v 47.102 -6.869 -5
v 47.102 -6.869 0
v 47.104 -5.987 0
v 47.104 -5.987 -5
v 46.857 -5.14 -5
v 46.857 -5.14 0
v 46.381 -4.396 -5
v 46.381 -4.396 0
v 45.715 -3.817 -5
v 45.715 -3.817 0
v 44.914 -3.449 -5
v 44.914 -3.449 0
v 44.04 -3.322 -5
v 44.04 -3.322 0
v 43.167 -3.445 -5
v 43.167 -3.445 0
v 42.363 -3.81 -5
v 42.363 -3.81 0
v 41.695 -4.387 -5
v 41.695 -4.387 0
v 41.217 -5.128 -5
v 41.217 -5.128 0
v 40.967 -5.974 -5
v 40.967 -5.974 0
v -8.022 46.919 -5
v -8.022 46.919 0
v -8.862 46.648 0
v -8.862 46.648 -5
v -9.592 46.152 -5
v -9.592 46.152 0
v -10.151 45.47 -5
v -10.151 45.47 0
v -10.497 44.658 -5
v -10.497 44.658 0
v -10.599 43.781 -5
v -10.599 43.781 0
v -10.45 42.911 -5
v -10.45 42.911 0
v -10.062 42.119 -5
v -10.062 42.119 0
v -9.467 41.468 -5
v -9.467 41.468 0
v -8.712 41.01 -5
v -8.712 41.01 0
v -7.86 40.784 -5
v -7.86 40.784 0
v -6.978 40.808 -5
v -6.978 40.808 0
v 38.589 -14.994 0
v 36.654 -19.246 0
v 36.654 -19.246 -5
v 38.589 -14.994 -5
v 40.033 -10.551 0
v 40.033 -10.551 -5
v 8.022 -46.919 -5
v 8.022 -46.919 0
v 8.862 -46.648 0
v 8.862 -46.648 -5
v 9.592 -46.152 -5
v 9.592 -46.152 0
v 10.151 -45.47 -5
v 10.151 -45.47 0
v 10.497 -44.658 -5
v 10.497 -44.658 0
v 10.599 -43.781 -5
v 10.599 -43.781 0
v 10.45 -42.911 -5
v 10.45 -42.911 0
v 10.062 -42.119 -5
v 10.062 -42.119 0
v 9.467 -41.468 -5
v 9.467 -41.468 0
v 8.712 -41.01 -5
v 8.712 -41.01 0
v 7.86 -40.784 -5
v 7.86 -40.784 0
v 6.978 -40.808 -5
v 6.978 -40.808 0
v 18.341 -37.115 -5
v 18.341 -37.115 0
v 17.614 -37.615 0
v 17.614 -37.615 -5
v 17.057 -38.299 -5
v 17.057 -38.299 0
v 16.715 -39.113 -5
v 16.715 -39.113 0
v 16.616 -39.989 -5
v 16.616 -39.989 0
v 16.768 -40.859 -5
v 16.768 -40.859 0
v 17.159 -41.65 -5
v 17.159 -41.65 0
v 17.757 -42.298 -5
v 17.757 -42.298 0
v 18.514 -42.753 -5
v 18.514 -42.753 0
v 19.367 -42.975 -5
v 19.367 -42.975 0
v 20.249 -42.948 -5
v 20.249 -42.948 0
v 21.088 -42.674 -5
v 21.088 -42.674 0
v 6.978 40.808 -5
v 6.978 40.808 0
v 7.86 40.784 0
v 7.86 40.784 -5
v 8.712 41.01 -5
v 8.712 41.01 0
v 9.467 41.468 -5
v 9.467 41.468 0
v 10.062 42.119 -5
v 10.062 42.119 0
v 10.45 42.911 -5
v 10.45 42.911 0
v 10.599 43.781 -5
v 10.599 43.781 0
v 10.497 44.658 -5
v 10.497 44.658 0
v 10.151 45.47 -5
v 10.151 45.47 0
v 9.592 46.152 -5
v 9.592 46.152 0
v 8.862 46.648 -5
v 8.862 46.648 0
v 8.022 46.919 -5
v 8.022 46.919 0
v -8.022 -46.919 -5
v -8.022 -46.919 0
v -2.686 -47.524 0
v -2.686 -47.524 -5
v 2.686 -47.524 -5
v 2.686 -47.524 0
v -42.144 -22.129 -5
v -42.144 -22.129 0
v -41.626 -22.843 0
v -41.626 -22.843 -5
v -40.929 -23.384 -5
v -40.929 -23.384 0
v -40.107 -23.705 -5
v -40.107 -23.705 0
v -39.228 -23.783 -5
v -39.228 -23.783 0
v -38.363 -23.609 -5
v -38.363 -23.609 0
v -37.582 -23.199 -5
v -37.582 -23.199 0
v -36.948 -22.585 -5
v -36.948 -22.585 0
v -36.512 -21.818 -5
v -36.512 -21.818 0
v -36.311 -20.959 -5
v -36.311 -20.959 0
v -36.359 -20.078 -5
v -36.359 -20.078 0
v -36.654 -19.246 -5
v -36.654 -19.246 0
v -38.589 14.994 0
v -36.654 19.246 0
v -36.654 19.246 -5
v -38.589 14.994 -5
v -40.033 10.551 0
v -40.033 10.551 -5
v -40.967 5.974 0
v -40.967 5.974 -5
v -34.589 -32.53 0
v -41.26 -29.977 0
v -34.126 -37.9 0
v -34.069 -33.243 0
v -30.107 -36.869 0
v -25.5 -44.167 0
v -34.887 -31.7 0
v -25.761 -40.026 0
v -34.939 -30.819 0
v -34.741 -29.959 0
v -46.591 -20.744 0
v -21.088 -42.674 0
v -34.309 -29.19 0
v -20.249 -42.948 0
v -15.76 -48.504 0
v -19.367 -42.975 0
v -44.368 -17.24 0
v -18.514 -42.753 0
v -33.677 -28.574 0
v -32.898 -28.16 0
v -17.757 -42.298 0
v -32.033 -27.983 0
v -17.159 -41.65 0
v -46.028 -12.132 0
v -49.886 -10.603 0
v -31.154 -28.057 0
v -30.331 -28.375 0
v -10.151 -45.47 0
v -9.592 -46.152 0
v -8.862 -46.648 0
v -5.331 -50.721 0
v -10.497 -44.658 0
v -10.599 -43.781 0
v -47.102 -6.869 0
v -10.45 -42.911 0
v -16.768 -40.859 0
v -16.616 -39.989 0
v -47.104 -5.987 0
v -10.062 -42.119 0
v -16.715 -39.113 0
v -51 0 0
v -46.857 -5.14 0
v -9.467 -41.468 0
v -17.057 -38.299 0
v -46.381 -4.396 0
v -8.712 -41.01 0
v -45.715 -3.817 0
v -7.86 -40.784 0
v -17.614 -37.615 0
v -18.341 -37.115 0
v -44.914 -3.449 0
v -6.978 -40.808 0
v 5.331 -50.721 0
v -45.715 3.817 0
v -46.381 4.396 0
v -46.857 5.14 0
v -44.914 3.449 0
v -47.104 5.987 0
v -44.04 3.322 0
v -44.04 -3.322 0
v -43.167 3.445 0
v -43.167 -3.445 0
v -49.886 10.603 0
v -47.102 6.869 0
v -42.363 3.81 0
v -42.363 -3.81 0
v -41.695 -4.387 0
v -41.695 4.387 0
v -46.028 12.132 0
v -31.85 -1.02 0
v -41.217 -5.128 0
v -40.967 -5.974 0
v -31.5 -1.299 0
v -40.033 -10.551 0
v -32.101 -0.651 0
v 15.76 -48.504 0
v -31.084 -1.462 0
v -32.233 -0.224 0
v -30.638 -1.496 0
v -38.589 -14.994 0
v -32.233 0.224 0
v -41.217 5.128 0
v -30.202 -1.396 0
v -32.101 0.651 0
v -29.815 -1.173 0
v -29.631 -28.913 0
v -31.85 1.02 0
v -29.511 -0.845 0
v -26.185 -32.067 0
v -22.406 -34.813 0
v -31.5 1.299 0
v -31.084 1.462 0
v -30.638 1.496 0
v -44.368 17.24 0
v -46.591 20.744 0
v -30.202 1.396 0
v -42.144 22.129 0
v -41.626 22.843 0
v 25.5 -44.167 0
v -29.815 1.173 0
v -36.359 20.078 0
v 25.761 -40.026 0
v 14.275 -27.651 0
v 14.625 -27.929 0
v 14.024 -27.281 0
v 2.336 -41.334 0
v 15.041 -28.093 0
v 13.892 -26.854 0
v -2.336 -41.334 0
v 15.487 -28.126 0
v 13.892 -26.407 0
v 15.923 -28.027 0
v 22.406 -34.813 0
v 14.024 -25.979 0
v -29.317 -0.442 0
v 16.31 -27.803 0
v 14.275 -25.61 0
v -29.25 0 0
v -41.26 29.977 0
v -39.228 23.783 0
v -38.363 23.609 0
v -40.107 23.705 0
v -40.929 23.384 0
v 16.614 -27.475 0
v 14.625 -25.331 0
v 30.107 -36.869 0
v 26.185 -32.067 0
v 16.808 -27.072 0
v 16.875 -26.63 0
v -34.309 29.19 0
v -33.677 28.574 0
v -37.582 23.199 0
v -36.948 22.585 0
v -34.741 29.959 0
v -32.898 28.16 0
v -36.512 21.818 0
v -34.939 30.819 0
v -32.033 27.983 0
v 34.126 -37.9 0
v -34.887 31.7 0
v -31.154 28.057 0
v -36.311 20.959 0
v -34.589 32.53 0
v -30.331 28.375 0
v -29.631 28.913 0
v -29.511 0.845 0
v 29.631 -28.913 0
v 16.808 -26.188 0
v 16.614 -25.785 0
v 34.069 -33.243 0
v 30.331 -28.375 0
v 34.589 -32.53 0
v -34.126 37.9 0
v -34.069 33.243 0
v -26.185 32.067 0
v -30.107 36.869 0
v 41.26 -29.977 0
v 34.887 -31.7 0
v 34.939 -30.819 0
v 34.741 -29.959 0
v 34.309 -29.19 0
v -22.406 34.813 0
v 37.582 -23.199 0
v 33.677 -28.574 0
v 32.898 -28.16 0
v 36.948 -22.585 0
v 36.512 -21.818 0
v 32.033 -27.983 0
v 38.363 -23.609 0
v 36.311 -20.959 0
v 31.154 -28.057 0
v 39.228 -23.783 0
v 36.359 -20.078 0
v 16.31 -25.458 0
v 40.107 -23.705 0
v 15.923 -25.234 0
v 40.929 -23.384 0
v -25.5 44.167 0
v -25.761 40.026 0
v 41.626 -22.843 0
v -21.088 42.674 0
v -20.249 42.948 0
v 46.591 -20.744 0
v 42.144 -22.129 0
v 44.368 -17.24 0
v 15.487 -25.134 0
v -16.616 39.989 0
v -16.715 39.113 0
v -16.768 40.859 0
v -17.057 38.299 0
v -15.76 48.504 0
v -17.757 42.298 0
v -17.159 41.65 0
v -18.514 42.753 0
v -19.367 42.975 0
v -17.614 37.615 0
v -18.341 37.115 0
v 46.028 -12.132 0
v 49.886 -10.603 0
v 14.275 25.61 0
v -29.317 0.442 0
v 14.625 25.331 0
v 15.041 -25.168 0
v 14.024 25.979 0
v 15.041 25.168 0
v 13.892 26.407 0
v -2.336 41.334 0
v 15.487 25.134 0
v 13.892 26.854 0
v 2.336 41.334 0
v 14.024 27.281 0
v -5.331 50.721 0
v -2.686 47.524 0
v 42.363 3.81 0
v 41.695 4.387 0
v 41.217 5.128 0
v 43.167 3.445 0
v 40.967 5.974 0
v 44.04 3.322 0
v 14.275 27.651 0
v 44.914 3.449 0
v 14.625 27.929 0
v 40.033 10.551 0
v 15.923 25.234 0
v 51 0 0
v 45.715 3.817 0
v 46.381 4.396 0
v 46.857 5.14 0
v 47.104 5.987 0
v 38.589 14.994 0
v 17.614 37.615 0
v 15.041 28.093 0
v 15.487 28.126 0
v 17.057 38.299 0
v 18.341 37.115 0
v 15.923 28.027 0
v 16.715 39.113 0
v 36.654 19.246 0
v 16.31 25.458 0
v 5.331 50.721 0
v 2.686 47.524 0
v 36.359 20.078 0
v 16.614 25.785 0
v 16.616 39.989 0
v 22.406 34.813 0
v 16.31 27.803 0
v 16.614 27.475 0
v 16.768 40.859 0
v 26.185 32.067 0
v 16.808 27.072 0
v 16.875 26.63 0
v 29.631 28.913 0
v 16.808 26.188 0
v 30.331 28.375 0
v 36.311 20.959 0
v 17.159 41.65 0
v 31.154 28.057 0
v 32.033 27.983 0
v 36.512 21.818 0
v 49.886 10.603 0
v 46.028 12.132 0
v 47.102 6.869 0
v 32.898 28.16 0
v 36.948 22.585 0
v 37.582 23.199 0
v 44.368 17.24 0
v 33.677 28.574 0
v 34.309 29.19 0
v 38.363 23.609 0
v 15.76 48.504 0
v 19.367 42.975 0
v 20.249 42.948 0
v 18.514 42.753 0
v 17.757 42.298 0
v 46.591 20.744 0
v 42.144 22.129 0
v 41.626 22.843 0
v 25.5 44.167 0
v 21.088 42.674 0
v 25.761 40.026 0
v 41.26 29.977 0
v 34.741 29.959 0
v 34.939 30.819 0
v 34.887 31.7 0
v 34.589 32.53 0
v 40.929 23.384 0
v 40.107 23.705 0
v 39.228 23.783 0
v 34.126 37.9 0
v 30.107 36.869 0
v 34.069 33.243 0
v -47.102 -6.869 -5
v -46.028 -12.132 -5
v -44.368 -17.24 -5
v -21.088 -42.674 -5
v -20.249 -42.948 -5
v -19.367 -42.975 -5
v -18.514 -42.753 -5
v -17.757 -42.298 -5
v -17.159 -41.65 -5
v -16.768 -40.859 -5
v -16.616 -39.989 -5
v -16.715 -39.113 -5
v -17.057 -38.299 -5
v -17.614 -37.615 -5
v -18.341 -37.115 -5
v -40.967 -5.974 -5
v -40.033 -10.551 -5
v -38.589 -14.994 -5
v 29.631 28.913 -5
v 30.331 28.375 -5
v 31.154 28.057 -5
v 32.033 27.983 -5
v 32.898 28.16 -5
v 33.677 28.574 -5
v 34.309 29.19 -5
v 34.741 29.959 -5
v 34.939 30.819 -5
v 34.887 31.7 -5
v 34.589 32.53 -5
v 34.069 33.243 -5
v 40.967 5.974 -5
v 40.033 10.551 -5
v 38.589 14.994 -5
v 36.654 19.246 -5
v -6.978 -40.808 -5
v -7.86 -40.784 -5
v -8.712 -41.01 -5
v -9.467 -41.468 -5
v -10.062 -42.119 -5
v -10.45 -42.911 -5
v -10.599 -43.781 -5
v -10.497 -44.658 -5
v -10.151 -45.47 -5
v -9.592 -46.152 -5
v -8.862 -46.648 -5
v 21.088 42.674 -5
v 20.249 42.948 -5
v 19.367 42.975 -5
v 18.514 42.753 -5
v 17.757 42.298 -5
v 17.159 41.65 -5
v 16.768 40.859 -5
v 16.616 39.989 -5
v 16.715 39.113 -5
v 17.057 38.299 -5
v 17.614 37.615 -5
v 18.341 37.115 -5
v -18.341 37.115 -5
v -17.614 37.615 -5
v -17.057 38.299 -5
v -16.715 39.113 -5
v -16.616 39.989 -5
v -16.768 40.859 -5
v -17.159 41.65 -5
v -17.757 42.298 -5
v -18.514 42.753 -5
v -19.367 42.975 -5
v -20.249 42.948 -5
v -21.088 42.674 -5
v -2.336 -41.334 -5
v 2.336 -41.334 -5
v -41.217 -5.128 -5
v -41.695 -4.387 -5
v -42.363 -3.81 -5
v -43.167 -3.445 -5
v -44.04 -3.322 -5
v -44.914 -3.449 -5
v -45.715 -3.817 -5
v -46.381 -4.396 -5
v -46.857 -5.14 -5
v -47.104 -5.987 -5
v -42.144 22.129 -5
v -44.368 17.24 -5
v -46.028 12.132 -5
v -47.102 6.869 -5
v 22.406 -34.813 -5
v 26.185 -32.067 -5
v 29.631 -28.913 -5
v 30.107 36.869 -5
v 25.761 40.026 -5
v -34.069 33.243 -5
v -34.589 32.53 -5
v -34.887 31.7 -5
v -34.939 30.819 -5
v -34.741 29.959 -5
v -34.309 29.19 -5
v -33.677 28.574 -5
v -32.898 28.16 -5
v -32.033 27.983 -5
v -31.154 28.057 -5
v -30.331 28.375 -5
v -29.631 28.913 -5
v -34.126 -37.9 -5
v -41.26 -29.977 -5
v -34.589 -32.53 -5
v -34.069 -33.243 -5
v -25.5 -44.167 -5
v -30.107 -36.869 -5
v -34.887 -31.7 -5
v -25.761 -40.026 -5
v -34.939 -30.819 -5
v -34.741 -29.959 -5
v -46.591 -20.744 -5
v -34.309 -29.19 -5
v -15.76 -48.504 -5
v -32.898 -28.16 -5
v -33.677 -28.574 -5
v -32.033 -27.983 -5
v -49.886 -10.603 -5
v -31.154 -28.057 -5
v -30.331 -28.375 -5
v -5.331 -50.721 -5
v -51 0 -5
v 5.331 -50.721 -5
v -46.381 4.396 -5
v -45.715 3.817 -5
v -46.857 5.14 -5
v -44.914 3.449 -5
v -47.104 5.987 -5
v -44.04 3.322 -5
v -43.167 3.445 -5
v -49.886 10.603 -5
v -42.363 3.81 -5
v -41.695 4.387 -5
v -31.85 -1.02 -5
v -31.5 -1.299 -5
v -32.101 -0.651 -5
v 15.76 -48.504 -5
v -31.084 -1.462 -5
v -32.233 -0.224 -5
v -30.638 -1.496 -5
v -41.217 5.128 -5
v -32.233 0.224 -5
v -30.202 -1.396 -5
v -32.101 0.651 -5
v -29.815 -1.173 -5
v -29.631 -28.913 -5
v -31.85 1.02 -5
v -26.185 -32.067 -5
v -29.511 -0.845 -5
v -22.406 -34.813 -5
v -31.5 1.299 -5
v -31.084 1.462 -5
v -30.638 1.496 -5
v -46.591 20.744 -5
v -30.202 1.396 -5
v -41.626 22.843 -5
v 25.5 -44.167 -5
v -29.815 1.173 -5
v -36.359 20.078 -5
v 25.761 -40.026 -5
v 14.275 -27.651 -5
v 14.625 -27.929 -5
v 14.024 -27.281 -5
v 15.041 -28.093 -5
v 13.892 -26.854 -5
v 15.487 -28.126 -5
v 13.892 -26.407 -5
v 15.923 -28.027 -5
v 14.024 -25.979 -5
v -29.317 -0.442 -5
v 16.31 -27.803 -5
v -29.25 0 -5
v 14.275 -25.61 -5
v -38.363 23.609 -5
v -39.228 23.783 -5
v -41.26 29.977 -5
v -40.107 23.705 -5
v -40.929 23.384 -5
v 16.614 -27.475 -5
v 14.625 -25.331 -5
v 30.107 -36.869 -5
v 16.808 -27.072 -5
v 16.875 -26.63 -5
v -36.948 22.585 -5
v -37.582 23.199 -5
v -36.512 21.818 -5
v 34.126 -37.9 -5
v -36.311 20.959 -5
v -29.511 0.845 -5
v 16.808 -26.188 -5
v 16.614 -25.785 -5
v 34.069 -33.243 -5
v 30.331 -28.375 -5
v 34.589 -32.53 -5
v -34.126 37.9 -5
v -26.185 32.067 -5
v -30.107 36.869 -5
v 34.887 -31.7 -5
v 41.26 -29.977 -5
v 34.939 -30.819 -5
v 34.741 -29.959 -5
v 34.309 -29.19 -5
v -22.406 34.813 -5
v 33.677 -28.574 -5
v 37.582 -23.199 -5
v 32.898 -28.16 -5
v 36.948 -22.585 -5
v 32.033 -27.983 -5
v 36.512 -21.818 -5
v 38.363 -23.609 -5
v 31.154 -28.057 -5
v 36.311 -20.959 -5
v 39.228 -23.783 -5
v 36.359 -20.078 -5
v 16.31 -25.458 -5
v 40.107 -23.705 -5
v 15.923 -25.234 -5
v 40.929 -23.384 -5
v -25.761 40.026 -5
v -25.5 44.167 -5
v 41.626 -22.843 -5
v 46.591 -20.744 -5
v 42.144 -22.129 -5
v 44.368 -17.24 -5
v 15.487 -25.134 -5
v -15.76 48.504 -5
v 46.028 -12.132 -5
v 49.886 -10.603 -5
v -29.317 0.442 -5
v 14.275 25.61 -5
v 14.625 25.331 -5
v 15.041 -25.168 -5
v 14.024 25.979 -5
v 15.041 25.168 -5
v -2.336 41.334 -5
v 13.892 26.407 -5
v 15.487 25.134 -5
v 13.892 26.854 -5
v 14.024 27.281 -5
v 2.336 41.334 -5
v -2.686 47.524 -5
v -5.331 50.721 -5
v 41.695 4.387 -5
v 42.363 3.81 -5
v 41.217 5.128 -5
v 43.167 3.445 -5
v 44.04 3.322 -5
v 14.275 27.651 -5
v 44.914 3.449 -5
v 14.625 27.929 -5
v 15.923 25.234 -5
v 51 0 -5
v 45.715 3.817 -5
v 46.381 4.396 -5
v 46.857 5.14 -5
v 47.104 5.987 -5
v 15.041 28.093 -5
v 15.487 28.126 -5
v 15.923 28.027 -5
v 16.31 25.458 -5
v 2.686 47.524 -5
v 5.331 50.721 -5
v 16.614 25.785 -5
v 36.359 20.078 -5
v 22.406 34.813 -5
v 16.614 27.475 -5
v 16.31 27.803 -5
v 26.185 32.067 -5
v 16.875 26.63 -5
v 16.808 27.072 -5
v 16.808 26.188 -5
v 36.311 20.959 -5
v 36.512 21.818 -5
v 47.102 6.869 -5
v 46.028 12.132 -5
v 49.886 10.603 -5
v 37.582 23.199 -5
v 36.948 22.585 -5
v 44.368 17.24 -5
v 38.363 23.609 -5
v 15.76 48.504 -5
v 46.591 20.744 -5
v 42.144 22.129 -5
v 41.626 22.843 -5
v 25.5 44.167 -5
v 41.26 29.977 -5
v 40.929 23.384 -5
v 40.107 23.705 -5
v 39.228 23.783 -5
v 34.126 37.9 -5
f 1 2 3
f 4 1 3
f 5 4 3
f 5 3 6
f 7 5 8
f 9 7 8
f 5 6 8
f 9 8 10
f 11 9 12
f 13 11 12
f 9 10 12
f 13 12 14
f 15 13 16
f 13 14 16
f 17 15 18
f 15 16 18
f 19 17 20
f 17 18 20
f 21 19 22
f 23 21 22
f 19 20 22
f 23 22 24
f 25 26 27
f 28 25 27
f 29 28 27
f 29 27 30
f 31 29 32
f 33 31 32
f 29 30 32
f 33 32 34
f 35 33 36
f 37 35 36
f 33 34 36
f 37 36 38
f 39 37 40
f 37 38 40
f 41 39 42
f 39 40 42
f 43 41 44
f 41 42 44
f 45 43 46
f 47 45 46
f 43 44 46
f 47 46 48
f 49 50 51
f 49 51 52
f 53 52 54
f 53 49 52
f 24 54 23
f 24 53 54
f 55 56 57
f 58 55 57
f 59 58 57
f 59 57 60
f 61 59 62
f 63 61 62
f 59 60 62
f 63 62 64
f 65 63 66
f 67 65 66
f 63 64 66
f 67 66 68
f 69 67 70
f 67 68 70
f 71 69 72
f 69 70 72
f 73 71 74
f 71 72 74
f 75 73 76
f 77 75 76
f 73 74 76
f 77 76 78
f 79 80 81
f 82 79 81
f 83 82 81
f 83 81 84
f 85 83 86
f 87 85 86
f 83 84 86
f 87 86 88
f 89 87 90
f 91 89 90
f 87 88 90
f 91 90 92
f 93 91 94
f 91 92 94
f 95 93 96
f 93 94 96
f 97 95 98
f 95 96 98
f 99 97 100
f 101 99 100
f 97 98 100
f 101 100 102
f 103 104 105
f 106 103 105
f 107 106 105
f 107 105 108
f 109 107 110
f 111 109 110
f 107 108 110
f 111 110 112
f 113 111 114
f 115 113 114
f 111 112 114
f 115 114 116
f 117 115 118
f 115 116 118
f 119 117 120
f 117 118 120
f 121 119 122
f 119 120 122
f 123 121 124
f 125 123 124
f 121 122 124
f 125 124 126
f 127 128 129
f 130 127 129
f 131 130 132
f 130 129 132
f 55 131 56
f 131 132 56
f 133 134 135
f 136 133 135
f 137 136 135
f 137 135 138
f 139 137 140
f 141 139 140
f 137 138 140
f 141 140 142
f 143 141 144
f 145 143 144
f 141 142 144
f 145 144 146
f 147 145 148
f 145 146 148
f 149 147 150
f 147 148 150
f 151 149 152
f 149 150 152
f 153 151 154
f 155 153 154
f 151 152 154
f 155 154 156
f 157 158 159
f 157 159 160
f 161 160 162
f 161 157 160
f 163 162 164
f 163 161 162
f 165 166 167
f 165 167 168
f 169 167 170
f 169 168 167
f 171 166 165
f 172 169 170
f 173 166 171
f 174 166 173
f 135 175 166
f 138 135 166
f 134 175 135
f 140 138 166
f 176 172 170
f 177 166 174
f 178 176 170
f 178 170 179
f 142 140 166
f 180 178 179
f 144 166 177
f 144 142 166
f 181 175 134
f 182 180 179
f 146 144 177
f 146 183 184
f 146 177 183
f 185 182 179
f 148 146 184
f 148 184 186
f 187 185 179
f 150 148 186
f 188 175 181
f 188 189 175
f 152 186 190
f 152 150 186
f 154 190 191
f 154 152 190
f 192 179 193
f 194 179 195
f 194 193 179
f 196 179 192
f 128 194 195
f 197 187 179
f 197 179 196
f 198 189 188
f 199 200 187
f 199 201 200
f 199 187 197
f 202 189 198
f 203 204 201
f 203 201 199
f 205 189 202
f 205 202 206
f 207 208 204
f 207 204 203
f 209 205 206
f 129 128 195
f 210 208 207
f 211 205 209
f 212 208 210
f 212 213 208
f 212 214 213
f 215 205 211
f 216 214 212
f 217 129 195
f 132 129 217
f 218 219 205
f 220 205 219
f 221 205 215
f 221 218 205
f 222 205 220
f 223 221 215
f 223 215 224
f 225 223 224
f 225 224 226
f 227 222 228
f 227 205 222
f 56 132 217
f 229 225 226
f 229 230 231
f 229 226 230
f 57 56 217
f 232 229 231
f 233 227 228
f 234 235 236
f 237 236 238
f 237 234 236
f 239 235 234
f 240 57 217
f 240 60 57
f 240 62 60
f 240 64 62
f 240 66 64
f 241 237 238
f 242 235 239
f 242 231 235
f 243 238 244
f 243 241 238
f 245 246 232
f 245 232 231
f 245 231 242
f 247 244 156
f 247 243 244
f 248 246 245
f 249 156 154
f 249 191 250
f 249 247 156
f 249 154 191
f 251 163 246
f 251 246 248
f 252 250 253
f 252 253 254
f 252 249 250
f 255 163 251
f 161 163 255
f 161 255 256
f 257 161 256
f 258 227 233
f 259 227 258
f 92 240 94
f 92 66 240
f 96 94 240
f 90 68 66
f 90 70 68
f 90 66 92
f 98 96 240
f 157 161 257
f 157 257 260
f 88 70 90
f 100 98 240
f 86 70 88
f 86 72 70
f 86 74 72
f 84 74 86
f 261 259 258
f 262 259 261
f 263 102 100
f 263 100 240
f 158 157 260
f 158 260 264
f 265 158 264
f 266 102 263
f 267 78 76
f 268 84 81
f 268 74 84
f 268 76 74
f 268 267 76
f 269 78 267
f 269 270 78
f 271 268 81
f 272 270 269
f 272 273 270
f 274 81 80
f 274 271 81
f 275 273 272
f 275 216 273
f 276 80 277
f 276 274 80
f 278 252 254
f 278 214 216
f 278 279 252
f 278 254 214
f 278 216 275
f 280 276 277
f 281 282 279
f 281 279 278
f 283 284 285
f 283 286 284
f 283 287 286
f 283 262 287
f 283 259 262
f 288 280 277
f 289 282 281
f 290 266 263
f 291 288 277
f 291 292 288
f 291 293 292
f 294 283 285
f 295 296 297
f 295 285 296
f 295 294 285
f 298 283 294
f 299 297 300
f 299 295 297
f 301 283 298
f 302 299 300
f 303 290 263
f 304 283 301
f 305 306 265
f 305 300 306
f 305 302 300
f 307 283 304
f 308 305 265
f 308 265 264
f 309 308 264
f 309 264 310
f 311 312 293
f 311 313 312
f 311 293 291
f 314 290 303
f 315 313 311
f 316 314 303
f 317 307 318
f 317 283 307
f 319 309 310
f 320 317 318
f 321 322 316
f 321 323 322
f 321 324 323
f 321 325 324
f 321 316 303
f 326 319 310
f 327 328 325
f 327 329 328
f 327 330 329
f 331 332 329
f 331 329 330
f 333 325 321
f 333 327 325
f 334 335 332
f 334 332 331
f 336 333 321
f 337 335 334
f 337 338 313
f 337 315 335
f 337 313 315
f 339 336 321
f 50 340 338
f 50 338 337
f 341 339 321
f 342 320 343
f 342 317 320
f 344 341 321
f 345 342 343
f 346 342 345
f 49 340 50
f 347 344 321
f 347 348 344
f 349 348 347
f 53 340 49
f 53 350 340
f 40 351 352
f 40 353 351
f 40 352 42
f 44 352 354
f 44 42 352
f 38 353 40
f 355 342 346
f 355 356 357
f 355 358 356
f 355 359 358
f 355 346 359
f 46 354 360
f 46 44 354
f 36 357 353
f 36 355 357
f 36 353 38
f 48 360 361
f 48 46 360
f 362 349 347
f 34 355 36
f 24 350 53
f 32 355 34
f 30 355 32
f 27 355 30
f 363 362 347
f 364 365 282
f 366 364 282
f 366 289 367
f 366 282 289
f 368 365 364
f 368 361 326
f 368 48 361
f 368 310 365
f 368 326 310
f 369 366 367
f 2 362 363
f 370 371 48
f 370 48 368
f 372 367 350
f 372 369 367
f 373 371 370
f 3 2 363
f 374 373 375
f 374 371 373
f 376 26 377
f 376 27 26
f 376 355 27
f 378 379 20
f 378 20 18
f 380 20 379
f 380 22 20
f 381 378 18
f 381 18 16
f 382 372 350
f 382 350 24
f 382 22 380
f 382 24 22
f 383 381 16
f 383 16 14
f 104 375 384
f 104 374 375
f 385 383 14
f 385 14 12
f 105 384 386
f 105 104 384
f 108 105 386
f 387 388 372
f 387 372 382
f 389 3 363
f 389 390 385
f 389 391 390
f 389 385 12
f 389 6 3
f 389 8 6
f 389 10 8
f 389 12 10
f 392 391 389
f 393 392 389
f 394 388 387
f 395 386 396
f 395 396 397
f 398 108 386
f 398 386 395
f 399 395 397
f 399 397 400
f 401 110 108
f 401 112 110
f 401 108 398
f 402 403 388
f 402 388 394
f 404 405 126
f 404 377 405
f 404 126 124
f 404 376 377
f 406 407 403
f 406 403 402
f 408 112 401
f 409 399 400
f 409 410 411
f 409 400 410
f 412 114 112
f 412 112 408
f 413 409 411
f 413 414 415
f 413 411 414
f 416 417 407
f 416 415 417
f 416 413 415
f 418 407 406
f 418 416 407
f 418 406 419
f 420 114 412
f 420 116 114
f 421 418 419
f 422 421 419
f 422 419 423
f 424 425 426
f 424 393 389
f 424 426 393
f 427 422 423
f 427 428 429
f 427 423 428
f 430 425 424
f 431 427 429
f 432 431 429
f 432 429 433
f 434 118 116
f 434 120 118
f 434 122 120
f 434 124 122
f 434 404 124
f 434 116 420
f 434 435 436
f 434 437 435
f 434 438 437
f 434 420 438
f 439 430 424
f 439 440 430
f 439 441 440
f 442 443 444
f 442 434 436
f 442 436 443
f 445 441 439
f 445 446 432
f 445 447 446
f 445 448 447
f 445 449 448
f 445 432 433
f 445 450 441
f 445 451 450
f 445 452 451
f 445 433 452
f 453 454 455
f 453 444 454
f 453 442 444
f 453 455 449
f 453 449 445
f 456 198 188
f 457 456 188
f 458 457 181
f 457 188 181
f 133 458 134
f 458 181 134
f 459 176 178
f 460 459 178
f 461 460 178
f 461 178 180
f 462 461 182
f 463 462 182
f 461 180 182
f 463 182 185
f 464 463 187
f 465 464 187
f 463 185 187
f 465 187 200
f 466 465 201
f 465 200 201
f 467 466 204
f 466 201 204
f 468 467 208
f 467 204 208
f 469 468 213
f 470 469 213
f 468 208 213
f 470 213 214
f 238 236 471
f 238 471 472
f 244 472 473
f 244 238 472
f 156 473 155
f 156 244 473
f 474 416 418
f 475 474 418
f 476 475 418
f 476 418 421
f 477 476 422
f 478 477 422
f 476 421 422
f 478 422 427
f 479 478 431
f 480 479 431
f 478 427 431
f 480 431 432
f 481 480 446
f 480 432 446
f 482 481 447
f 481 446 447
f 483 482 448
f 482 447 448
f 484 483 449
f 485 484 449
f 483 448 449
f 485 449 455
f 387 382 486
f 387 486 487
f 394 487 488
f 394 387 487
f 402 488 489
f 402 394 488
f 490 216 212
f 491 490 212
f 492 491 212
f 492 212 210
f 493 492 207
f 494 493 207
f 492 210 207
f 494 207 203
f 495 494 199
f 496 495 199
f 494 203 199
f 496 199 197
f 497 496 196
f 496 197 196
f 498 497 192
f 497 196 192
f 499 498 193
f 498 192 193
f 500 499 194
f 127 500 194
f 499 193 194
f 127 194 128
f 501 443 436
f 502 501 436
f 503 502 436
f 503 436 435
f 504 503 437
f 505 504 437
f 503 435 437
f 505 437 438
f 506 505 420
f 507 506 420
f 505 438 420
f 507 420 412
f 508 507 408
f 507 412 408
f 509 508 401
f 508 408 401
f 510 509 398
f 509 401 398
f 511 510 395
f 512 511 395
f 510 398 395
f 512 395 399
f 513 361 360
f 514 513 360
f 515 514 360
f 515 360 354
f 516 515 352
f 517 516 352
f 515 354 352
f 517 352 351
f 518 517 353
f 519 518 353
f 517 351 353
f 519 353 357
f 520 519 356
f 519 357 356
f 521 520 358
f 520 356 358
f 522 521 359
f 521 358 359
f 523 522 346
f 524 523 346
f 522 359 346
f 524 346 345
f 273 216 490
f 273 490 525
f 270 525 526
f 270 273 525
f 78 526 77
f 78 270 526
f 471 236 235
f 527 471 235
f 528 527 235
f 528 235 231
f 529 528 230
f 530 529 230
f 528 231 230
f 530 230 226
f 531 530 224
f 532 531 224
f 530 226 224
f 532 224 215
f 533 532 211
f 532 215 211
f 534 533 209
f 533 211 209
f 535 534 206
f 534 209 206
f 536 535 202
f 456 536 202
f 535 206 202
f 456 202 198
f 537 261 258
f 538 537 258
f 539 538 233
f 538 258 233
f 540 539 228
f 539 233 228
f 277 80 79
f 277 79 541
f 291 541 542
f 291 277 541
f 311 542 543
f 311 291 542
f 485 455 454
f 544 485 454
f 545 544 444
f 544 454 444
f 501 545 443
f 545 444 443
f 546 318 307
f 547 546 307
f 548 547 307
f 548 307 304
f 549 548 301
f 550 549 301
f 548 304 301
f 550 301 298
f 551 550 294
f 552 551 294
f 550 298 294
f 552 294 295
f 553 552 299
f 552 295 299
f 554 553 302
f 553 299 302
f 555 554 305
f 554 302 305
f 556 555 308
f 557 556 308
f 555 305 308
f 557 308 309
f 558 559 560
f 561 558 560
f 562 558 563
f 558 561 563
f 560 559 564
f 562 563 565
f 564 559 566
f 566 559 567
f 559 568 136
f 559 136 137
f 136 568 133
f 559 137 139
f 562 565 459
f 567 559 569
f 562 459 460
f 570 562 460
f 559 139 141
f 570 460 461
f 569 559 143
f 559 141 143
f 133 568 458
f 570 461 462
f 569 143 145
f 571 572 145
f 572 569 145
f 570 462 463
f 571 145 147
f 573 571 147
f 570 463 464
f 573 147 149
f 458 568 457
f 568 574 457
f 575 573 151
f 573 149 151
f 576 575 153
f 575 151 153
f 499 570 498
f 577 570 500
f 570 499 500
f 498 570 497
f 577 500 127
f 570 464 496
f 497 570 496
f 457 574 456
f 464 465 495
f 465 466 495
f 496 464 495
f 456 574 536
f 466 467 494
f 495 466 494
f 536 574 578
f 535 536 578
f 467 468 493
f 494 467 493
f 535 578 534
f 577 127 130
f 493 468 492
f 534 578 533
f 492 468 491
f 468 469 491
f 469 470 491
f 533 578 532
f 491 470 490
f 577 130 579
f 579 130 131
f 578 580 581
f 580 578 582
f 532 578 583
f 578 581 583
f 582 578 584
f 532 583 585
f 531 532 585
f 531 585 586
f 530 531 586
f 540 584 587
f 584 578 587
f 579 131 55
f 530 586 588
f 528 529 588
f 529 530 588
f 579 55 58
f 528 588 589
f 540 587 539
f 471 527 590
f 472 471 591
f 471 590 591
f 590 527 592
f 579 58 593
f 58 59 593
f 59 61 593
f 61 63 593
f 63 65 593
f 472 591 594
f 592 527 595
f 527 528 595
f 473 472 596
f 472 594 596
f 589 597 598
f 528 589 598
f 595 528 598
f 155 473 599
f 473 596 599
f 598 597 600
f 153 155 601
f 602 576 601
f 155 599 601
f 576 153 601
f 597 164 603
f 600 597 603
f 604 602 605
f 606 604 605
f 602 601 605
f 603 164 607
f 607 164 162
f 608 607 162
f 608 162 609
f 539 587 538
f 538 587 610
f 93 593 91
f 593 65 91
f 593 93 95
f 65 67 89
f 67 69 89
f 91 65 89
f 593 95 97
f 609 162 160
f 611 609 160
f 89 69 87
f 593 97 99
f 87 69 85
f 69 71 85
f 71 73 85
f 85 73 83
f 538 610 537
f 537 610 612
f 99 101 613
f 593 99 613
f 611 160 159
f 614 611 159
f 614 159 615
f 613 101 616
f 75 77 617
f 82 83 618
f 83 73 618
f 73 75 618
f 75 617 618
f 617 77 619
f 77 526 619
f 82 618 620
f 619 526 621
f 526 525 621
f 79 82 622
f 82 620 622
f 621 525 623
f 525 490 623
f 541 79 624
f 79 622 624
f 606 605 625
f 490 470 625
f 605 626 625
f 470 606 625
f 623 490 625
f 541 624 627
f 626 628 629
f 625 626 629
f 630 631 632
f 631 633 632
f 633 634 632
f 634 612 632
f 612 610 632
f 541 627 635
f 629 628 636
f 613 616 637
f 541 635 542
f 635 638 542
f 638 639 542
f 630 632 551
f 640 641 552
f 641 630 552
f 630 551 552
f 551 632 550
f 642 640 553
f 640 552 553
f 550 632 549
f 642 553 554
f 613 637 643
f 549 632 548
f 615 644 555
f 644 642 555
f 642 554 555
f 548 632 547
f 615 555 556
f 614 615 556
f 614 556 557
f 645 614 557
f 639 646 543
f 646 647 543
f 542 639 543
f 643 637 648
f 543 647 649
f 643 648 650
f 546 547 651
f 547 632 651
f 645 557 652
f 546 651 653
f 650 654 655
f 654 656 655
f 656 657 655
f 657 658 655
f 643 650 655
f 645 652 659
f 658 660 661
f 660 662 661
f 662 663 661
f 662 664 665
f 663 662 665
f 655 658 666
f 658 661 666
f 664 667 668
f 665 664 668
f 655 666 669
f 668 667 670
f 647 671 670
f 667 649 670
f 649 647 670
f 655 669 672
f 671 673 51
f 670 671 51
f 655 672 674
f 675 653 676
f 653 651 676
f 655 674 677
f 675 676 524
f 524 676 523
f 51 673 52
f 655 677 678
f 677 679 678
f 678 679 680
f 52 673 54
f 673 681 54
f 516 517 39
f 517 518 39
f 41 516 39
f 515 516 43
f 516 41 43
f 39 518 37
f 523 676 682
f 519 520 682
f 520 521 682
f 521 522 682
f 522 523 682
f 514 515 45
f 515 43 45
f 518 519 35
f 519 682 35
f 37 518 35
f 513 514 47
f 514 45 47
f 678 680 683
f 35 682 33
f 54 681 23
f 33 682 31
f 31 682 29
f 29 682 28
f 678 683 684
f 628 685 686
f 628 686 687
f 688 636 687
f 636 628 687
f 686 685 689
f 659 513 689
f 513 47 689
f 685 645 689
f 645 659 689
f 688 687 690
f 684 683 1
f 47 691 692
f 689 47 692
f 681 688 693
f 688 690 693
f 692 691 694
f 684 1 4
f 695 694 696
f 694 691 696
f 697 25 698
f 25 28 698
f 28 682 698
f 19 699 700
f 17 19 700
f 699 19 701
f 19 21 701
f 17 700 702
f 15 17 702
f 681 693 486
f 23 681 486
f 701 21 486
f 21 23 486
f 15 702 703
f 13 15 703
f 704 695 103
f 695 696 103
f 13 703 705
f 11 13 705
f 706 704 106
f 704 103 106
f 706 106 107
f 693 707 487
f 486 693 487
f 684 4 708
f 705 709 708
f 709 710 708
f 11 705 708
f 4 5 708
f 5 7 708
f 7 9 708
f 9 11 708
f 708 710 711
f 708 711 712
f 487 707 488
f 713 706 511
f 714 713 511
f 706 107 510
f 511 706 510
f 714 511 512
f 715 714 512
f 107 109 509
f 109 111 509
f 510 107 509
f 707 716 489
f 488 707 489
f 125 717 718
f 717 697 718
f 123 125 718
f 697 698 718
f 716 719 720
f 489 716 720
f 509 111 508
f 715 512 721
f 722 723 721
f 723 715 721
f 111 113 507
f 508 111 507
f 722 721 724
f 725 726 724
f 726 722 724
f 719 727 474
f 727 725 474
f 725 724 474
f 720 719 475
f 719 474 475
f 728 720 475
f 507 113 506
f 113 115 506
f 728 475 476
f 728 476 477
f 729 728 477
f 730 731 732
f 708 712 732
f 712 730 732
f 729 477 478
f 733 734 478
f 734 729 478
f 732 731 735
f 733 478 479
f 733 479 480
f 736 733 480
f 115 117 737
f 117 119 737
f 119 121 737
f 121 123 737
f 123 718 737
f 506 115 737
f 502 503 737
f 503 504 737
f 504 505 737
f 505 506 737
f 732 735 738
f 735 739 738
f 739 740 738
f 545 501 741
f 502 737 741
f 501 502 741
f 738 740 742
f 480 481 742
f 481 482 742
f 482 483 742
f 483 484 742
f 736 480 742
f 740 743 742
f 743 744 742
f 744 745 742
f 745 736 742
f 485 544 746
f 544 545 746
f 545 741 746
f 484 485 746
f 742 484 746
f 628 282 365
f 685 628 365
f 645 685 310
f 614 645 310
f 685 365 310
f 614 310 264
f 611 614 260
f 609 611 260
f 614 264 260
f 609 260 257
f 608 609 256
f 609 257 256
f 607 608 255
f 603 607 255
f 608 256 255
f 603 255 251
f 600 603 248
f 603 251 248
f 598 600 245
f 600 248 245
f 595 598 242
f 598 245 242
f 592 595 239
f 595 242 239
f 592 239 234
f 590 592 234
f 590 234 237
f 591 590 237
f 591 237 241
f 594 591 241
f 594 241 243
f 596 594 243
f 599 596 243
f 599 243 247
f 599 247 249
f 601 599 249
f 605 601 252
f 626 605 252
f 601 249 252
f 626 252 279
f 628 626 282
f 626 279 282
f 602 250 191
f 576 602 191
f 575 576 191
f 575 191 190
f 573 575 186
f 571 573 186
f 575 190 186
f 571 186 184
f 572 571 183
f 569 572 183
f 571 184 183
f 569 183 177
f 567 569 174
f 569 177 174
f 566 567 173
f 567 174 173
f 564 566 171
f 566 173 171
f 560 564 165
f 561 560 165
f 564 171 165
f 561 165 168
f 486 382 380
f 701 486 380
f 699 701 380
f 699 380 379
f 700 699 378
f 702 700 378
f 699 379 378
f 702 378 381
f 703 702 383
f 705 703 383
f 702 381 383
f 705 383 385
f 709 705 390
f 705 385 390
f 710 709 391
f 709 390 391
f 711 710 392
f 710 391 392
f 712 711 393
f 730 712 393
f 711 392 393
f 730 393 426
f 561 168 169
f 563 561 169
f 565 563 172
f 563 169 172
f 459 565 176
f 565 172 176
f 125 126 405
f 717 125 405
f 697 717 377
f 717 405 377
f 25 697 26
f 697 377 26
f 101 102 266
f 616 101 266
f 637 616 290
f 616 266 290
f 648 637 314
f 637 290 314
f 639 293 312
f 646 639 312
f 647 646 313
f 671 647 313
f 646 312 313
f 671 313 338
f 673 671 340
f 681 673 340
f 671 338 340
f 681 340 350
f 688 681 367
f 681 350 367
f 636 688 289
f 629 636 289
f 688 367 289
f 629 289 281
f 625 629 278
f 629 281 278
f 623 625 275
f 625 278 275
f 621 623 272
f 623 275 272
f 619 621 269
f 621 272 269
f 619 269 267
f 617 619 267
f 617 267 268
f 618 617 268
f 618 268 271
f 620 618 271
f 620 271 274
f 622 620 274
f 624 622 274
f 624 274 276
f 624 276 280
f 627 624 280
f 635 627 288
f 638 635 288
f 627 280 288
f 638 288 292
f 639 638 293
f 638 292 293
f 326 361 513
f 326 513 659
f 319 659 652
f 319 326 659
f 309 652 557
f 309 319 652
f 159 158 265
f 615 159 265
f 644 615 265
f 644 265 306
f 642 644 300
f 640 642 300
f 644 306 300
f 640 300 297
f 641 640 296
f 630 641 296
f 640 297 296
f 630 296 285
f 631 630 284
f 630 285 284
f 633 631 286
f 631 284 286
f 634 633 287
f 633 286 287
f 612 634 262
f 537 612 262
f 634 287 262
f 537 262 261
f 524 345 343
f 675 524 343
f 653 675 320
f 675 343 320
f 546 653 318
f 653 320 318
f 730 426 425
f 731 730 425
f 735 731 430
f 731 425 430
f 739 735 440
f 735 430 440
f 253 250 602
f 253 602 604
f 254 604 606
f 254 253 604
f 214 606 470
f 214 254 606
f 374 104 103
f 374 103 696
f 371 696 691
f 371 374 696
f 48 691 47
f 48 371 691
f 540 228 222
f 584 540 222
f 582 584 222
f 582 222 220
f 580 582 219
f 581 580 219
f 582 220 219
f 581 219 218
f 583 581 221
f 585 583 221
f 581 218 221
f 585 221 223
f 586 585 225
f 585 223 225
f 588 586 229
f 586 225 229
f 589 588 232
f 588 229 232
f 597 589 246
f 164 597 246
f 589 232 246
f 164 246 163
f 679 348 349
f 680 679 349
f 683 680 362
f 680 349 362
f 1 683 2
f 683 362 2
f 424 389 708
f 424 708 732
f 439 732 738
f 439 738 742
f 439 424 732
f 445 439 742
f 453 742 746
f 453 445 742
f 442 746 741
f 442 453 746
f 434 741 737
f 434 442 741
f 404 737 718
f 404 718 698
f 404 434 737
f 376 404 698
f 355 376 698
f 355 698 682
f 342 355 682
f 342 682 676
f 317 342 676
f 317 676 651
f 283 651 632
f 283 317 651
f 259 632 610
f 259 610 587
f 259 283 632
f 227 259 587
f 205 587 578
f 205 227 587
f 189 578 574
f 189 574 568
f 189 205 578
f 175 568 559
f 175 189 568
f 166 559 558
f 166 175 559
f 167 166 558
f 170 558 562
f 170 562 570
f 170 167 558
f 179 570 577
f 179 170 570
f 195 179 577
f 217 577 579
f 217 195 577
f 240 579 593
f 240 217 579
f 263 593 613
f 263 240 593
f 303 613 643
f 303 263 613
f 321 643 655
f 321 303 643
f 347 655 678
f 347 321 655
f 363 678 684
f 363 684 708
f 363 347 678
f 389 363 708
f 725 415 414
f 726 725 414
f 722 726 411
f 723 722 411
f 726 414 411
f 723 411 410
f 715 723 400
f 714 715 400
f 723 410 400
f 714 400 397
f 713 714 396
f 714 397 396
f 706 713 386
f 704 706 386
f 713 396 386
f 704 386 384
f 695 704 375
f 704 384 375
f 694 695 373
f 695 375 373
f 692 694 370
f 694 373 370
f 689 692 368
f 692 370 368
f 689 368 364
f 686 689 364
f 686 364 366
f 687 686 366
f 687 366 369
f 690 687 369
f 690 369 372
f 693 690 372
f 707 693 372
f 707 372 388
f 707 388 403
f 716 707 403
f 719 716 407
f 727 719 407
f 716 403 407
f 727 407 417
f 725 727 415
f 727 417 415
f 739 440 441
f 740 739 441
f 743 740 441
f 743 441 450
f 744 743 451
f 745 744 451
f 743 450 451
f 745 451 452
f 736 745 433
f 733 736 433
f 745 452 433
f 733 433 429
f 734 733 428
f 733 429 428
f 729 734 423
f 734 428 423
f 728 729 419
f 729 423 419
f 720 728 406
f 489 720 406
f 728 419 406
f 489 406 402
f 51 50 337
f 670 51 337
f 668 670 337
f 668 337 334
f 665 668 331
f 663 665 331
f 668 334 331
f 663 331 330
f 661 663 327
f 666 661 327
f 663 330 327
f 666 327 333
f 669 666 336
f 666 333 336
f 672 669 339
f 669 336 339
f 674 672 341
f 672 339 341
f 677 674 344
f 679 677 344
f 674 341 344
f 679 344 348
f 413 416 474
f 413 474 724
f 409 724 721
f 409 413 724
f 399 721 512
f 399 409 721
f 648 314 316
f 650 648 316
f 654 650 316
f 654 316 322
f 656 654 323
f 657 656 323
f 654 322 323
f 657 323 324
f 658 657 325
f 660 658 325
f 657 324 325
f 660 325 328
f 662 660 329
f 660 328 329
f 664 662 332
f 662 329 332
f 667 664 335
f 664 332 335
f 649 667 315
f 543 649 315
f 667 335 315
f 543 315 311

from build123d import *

# Parameters (mm, degrees)
SKETCH015_R        = 51
SKETCH015_R_2      = 1.5
PAD013_DEPTH       = 5
POCKET001_DEPTH    = 5
POLARPATTERN_COUNT = 10


with BuildPart() as part:
    # Sketch015 → Pad013 (new body)
    with BuildSketch(Plane.XY):
        Circle(SKETCH015_R)
        with Locations((15.375, 26.630281)):
            Circle(SKETCH015_R_2, mode=Mode.SUBTRACT)
        with Locations((-30.75, 0)):
            Circle(SKETCH015_R_2, mode=Mode.SUBTRACT)
        with Locations((15.375, -26.630281)):
            Circle(SKETCH015_R_2, mode=Mode.SUBTRACT)
    extrude(amount=-PAD013_DEPTH)

    # Sketch025 → Pocket001 (cut)
    with BuildSketch(Plane.XY):
        with BuildLine():
            ThreePointArc((8.022472, 46.919079), (0, 47.6), (-8.022472, 46.919079))
            ThreePointArc((-8.022472, 46.919079), (-10.555654, 43.340952), (-6.977528, 40.80777))
            ThreePointArc((6.977528, 40.80777), (0, 41.4), (-6.977528, 40.80777))
            ThreePointArc((6.977528, 40.80777), (10.555654, 43.340952), (8.022472, 46.919079))
        make_face()
    pocket001 = extrude(amount=-POCKET001_DEPTH, mode=Mode.SUBTRACT)

    # PolarPattern: Pocket001 ×10 about axis
    polarpattern_axis = Axis((0, 0, 0), (0, 0, 1))
    for i in range(1, POLARPATTERN_COUNT):
        add(pocket001.rotate(polarpattern_axis, i * 360 / POLARPATTERN_COUNT), mode=Mode.SUBTRACT)


solid = part.part
